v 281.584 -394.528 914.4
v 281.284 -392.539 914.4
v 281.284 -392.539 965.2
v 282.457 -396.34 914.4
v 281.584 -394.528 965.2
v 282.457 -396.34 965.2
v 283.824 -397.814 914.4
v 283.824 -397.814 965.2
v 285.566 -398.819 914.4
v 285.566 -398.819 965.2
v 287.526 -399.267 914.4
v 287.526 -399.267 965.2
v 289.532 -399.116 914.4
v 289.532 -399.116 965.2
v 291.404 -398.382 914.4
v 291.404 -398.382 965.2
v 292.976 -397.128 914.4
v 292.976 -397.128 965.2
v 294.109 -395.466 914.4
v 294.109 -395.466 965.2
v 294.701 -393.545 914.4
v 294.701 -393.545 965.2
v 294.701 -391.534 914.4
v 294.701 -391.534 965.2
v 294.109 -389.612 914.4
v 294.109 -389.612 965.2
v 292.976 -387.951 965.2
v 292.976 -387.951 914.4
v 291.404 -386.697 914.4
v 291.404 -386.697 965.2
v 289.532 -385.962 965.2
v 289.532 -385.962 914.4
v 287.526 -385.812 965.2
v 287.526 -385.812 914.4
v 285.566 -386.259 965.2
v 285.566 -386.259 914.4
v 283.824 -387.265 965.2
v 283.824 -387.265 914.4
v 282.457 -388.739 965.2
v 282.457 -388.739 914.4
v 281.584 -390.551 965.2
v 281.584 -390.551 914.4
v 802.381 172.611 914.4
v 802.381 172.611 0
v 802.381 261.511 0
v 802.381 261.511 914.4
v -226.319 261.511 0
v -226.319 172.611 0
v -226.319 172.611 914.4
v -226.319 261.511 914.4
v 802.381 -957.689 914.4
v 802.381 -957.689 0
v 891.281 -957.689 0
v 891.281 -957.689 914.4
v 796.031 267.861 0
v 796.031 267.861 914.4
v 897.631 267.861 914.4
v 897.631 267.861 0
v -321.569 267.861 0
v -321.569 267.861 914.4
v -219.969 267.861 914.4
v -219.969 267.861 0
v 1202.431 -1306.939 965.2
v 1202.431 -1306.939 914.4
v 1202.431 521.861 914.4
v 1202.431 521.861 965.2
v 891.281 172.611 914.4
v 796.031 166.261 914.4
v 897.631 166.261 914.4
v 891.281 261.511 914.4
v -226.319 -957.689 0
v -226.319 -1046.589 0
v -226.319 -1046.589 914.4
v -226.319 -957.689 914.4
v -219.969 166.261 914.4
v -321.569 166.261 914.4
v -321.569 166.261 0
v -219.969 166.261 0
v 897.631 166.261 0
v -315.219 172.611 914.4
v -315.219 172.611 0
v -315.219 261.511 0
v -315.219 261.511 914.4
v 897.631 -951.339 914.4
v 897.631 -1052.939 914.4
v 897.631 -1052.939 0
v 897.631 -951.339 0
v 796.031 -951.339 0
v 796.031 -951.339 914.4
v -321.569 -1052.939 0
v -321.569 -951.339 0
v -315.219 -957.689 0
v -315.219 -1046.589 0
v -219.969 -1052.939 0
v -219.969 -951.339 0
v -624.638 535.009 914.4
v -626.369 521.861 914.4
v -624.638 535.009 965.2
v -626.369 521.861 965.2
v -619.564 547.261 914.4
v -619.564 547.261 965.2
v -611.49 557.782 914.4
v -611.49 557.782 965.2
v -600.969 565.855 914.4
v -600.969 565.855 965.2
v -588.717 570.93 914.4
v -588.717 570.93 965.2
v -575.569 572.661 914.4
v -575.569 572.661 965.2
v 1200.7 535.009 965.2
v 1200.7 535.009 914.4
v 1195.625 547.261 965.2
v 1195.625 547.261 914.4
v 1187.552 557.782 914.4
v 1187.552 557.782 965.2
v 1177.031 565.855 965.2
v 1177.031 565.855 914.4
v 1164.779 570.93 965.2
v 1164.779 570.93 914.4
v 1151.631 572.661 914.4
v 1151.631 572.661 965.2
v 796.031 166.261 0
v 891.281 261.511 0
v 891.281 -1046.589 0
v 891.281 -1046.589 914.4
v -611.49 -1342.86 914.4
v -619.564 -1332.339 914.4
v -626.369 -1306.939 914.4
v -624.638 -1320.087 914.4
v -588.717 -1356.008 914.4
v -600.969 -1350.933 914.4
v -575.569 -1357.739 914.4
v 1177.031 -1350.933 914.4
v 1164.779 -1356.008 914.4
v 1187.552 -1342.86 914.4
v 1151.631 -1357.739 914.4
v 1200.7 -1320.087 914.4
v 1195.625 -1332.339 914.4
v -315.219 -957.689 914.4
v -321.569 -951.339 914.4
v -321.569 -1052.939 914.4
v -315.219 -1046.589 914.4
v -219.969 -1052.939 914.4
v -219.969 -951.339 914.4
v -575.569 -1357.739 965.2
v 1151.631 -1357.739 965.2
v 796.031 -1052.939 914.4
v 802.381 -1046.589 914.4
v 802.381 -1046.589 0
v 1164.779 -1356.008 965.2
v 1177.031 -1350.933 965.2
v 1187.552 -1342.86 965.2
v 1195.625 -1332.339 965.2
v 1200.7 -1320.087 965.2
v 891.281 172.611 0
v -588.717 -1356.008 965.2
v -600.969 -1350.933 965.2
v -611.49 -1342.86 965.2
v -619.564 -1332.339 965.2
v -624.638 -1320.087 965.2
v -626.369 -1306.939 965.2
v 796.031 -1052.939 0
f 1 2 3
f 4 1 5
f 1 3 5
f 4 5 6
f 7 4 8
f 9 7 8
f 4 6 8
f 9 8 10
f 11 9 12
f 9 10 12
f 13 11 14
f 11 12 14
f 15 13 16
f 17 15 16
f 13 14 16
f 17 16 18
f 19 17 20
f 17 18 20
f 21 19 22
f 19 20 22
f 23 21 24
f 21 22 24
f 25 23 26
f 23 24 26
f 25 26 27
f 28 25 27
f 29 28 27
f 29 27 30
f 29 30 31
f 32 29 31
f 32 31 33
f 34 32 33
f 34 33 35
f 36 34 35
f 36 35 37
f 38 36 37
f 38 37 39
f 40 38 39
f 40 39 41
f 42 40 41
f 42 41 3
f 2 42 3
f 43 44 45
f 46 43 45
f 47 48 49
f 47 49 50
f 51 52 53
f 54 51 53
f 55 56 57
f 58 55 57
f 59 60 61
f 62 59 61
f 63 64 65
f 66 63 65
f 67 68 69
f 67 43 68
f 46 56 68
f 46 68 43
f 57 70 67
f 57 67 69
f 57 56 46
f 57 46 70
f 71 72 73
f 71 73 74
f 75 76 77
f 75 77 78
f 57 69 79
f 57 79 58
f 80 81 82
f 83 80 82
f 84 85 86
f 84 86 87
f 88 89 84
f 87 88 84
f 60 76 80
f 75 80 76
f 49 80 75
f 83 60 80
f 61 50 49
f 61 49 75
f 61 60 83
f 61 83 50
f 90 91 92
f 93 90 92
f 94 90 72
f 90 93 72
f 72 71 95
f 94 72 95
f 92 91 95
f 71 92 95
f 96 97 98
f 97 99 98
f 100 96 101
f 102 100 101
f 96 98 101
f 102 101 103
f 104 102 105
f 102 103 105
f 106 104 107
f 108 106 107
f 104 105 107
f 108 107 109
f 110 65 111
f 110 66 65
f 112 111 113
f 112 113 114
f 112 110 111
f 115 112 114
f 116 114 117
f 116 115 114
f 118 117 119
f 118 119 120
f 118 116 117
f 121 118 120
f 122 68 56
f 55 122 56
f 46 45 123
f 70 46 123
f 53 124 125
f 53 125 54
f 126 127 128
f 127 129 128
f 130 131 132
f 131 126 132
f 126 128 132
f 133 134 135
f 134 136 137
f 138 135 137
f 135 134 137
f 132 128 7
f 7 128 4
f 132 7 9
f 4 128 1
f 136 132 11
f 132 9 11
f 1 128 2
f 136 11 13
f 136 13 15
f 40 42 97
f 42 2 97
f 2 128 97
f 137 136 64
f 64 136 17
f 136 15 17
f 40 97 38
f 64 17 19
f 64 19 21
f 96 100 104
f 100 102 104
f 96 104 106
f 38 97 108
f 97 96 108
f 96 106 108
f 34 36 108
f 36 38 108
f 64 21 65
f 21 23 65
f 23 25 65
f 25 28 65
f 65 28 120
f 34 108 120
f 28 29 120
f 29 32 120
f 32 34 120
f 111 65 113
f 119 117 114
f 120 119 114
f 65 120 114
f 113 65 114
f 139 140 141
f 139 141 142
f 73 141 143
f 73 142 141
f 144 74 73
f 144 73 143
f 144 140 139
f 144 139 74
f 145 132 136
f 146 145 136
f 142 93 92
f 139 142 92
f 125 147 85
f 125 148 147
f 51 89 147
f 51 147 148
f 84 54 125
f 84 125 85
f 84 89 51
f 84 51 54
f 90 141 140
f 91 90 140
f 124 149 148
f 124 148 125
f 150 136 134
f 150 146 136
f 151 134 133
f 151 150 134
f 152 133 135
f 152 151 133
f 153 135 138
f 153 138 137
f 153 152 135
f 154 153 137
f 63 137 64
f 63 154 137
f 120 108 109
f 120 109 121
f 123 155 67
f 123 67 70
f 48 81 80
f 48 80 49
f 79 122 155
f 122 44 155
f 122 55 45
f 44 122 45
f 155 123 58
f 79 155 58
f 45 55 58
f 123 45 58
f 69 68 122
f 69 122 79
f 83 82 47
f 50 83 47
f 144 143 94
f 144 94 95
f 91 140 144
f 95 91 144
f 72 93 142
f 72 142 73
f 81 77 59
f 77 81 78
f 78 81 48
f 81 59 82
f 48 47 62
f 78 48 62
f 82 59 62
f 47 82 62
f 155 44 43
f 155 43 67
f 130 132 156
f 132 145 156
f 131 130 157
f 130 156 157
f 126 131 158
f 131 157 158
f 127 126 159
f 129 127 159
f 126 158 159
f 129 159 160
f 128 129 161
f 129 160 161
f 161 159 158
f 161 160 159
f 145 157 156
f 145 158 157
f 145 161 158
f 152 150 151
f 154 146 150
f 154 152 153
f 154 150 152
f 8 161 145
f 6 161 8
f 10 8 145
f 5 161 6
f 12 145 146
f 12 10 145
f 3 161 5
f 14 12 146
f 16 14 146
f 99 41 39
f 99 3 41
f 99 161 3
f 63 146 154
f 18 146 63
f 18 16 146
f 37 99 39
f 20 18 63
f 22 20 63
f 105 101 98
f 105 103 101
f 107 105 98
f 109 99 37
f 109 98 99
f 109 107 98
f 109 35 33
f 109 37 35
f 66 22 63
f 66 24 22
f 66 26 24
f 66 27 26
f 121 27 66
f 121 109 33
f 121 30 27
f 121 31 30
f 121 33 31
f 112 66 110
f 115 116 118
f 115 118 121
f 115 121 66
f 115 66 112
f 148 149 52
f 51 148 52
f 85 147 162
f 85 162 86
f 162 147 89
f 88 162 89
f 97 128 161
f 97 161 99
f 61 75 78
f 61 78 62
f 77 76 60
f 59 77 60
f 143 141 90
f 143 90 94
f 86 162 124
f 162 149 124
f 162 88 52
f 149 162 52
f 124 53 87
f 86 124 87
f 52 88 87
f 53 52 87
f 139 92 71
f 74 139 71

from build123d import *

# Parameters (mm, degrees)
F0_W     = 101.6
F0_H     = 101.6
F0_W_2   = 88.9
F0_H_2   = 88.9
F1_DEPTH = 914.4
F2_W     = 1828.8
F2_H     = 1930.4
F3_DEPTH = 50.8
F4_R     = 50.8
F5_R     = 50.8
F6_D     = 13.49248


with BuildPart() as f1:
    # F0 (on Top) → F1 (new body)
    with BuildSketch(Plane.XY):
        with Locations((-270.7694334187, 217.0607238128)):
            Rectangle(F0_W, F0_H)
        with Locations((-270.7694334187, 217.0607238128)):
            Rectangle(F0_W_2, F0_H_2, mode=Mode.SUBTRACT)
    extrude(amount=F1_DEPTH)


with BuildPart() as f1b:
    # F0 (on Top) → F1, piece 2 (new body)
    with BuildSketch(Plane.XY):
        with Locations((846.8305665813, 217.0607238128)):
            Rectangle(F0_W, F0_H)
        with Locations((846.8305665813, 217.0607238128)):
            Rectangle(F0_W_2, F0_H_2, mode=Mode.SUBTRACT)
    extrude(amount=F1_DEPTH)


with BuildPart() as f1c:
    # F0 (on Top) → F1, piece 3 (new body)
    with BuildSketch(Plane.XY):
        with Locations((-270.7694334187, -1002.1392761872)):
            Rectangle(F0_W, F0_H)
        with Locations((-270.7694334187, -1002.1392761872)):
            Rectangle(F0_W_2, F0_H_2, mode=Mode.SUBTRACT)
    extrude(amount=F1_DEPTH)


with BuildPart() as f1d:
    # F0 (on Top) → F1, piece 4 (new body)
    with BuildSketch(Plane.XY):
        with Locations((846.8305665813, -1002.1392761872)):
            Rectangle(F0_W, F0_H)
        with Locations((846.8305665813, -1002.1392761872)):
            Rectangle(F0_W_2, F0_H_2, mode=Mode.SUBTRACT)
    extrude(amount=F1_DEPTH)


with BuildPart() as f3:
    # F2 (on face) → F3 (new body)
    with BuildSketch(Plane.XY.offset(914.4)):
        with Locations((288.0305665813, -392.5392761872)):
            Rectangle(F2_W, F2_H)
    extrude(amount=F3_DEPTH)

    # F4
    f4_edges = [f3.edges().sort_by_distance(p)[0] for p in [
        (1202.430567, -1357.739276, 939.8),
        (1202.430567, 572.660724, 939.8),
    ]]
    fillet(f4_edges, radius=F4_R)

    # F5
    f5_edges = [f3.edges().sort_by_distance(p)[0] for p in [
        (-626.369433, 572.660724, 939.8),
        (-626.369433, -1357.739276, 939.8),
    ]]
    fillet(f5_edges, radius=F5_R)

    # F6 (through all)
    with Locations(Plane(origin=(0, 0, 914.4), x_dir=(1, 0, 0), z_dir=(0, 0, -1))):
        with Locations((288.0305665813, 392.5392761872)):
            Hole(F6_D / 2)


solid = Compound([f1.part, f1b.part, f1c.part, f1d.part, f3.part])
